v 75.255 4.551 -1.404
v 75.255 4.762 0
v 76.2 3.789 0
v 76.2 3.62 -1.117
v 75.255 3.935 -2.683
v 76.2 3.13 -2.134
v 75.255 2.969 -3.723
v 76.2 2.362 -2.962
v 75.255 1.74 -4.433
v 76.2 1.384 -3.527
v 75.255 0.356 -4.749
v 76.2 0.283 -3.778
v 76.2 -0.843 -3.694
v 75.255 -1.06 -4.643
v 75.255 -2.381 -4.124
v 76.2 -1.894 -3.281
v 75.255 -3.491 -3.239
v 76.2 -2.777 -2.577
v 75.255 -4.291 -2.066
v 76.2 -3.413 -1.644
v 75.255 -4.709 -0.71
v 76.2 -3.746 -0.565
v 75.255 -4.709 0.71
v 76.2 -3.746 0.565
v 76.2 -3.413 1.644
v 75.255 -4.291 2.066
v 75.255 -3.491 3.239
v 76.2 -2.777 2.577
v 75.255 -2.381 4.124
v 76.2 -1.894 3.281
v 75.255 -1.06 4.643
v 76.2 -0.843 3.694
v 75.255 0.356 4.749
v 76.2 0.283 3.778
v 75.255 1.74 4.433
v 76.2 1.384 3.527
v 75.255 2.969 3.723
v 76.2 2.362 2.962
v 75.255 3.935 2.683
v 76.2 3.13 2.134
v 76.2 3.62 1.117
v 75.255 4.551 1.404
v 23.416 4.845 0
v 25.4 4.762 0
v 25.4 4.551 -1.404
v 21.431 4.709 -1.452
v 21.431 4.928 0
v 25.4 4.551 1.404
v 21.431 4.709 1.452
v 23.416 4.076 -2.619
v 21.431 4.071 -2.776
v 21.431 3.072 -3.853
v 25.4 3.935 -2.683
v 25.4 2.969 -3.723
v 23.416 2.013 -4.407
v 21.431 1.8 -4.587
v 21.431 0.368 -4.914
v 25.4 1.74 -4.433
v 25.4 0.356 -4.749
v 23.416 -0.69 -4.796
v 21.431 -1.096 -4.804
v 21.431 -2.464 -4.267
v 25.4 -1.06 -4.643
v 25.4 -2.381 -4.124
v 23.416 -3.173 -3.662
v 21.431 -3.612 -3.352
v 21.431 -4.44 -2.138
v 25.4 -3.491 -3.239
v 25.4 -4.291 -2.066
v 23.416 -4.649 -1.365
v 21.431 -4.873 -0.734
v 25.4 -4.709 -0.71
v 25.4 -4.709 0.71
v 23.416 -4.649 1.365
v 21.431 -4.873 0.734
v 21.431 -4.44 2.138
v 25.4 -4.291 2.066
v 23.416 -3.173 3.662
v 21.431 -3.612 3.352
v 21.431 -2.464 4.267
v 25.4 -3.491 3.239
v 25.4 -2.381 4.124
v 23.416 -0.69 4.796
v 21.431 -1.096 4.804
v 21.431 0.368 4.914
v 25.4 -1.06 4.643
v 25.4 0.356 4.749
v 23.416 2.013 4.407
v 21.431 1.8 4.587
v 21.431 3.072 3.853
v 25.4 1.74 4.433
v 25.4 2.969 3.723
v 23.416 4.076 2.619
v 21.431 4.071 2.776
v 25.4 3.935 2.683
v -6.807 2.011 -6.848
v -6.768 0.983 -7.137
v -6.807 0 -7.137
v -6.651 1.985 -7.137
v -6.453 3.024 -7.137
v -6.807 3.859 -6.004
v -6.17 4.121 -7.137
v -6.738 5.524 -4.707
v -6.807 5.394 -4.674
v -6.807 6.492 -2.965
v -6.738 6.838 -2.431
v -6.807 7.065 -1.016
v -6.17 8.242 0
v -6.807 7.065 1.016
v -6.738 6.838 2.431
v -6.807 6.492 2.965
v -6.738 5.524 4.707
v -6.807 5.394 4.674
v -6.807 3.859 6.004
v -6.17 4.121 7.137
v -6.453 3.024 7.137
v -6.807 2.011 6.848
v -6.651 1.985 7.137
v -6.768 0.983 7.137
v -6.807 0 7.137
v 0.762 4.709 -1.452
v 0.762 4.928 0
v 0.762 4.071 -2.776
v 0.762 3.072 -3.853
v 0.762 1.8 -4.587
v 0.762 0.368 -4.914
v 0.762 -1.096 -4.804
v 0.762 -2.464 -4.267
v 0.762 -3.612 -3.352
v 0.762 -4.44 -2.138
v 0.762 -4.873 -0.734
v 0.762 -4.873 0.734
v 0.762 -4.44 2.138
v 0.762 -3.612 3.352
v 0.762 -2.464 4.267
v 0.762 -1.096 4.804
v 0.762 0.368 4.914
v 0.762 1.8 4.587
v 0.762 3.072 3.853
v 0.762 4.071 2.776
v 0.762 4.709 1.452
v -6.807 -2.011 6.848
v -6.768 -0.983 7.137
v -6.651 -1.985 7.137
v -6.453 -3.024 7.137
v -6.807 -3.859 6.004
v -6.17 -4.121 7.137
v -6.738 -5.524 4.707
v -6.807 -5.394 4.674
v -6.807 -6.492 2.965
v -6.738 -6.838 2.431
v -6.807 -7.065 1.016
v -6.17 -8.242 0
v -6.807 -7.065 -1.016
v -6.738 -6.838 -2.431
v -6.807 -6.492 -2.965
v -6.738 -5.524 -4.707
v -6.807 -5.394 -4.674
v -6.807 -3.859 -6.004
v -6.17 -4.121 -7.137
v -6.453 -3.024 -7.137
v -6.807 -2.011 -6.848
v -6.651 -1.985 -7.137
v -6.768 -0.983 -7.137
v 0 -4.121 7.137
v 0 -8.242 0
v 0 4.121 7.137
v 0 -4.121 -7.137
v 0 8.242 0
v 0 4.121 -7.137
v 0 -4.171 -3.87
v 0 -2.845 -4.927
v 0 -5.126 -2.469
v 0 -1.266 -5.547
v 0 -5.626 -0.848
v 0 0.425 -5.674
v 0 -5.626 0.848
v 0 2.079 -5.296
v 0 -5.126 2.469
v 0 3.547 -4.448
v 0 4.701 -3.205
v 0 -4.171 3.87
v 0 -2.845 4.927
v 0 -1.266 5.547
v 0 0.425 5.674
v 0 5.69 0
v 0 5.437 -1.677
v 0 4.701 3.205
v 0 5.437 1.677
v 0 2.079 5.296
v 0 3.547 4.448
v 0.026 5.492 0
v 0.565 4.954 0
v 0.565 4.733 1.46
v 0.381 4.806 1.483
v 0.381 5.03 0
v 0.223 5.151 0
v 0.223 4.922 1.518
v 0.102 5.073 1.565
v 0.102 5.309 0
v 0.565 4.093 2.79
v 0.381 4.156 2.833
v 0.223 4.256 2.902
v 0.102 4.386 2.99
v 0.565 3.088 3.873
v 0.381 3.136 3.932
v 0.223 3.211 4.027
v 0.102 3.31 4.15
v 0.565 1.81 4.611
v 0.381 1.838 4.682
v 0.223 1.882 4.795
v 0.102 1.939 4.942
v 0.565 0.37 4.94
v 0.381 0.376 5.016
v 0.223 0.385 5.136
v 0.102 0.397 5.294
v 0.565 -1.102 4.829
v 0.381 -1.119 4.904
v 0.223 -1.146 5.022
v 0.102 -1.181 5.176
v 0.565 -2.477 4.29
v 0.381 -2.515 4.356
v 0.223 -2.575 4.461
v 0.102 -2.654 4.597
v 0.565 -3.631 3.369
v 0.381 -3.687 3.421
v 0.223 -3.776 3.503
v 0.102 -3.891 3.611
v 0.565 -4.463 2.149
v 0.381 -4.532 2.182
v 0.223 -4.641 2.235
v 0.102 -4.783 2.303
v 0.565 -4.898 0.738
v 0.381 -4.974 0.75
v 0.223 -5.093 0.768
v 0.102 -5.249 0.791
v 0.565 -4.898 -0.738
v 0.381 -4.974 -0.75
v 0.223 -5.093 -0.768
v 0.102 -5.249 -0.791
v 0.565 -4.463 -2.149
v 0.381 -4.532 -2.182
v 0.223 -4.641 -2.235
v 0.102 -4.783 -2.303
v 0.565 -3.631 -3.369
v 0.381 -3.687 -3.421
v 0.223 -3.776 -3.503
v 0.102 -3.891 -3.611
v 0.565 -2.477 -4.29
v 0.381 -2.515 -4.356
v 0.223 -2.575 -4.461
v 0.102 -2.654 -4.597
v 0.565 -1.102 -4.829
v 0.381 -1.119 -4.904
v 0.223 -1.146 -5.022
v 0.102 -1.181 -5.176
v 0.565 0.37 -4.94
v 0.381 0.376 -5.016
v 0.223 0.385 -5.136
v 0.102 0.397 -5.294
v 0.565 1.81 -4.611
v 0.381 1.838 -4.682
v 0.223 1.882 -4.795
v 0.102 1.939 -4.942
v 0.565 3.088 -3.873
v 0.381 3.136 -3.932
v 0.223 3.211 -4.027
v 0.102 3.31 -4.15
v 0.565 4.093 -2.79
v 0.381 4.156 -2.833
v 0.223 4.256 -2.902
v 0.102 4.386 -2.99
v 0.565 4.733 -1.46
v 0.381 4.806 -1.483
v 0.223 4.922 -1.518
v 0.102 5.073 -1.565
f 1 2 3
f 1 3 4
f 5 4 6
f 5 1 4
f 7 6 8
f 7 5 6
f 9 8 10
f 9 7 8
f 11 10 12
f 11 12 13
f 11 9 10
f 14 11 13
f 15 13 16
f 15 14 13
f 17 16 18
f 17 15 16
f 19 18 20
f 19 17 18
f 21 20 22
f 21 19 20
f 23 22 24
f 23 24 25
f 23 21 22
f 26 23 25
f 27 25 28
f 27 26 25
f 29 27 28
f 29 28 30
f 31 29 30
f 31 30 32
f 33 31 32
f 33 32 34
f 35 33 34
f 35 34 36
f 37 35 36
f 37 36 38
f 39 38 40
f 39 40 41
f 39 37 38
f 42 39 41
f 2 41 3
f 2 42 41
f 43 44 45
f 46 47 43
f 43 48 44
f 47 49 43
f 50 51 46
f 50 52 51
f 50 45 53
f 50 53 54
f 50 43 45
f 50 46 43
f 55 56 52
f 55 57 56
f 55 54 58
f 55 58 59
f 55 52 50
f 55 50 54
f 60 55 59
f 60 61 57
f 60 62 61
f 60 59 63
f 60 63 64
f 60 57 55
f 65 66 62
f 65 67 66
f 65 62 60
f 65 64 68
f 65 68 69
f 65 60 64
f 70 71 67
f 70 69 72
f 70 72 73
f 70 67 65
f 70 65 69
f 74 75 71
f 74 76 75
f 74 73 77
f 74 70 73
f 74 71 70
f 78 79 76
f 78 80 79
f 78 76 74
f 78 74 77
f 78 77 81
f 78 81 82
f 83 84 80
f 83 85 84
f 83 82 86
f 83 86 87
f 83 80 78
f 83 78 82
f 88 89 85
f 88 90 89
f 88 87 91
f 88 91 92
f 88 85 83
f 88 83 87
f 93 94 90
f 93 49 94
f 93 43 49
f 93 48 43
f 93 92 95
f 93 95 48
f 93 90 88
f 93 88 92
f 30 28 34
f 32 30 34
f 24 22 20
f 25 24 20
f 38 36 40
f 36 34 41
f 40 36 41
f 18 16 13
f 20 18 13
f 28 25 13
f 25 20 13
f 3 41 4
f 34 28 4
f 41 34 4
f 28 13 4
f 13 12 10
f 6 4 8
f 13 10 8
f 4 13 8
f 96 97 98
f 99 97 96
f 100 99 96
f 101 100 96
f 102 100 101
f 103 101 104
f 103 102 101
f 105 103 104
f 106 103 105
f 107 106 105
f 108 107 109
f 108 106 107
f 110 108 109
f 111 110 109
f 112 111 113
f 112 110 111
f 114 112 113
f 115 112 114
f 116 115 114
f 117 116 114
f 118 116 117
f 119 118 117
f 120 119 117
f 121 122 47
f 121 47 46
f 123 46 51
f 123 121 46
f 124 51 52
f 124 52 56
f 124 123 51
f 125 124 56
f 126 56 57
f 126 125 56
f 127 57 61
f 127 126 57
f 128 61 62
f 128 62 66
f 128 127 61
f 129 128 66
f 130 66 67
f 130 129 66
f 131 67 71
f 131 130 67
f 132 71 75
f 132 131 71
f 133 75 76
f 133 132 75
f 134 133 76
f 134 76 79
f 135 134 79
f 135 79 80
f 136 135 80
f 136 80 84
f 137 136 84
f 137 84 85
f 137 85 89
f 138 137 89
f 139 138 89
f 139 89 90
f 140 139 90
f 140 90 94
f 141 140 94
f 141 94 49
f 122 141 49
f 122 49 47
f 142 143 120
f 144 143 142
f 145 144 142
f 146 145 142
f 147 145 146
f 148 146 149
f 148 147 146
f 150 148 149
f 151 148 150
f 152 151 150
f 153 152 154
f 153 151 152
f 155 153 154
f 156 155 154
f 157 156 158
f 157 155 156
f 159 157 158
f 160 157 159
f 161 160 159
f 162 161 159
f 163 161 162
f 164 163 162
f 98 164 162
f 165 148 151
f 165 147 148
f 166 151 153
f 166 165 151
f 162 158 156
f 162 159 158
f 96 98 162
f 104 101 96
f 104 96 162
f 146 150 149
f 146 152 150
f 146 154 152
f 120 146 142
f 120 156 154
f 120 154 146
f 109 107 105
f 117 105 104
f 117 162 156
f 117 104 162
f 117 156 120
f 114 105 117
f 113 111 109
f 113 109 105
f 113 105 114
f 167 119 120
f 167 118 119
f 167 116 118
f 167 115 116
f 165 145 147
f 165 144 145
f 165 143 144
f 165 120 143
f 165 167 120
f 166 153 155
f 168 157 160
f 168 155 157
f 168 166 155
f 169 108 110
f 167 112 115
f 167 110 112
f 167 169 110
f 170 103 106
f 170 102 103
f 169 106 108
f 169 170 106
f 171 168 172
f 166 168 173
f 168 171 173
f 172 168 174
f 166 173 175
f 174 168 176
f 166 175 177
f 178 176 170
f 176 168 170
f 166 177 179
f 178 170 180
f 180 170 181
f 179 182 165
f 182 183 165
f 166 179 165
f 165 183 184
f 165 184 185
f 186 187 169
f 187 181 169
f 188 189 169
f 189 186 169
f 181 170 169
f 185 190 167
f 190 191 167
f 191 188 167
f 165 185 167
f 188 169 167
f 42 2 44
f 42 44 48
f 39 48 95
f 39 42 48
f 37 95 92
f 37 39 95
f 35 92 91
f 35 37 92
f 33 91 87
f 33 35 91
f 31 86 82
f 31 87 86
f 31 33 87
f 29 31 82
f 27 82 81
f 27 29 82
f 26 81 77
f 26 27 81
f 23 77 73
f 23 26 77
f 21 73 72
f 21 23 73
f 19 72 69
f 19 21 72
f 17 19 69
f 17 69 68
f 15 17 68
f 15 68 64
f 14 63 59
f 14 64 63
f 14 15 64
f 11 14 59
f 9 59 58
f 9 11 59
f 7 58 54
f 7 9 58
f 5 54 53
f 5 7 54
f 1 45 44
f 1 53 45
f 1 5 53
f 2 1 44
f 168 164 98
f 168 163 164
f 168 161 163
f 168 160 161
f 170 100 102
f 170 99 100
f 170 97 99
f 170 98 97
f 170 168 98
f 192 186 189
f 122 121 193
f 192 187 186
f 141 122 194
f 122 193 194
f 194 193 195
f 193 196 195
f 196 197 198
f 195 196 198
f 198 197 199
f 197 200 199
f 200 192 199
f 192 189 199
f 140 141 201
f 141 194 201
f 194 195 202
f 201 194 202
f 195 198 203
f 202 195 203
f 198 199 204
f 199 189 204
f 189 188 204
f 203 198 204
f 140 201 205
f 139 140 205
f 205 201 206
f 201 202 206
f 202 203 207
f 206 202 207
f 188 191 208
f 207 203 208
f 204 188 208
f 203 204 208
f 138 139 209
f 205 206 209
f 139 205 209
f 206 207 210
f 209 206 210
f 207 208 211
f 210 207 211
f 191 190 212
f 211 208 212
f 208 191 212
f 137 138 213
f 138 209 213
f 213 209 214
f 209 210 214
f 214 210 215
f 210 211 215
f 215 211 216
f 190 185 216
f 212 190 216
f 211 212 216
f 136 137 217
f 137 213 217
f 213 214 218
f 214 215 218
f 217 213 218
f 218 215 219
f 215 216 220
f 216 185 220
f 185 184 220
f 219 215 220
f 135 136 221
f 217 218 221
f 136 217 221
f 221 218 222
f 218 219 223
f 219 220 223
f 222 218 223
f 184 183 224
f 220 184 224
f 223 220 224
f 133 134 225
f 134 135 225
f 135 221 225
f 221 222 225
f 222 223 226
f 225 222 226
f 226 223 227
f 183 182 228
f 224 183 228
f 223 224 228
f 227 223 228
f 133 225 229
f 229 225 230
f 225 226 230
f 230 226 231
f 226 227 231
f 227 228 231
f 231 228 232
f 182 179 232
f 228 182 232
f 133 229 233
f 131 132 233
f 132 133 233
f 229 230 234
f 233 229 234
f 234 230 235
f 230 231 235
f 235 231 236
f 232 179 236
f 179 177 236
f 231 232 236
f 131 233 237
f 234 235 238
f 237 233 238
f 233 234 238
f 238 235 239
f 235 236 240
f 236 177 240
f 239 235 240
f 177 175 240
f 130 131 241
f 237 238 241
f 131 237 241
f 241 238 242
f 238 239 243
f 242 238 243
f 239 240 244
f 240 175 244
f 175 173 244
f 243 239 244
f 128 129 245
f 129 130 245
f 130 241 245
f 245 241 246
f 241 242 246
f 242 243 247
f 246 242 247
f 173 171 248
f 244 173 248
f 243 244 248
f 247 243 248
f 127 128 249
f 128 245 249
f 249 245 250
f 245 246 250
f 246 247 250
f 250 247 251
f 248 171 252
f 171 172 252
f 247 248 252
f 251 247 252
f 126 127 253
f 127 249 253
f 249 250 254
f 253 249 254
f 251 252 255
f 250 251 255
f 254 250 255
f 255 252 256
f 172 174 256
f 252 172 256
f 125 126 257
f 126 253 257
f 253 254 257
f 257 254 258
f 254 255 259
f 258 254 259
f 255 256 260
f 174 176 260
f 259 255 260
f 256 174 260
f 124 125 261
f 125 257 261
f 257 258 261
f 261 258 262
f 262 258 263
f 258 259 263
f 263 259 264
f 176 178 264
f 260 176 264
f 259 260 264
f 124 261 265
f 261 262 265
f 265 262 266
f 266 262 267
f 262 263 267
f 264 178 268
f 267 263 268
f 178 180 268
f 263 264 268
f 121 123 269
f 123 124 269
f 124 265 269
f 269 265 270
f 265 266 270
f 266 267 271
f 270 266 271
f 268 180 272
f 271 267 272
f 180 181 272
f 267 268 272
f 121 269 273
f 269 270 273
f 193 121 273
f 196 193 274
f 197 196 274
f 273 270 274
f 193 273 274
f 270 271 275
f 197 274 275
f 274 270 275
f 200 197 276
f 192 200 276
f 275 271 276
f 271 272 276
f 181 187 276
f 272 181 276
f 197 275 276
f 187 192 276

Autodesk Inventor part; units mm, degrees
ref_plane "YZ Plane" through (0, 0, 0) normal (1, 0, 0) x (0, 1, 0)
ref_plane "XZ Plane" through (0, 0, 0) normal (0, 1, 0) x (-1, 0, 0)
sketch "Sketch1" plane through (0, 0, 0) normal (0, 0, 1) x (1, 0, 0)
  line L0 (0, 7.1374) -> (0, 4.9276)
  line L1 (25.4, 4.7625) -> (76.2, 4.7625)
  line L2 (76.2, 4.7625) -> (76.2, 0)
  line L3 (76.2, 0) -> (-0.0001, 0)
  line L4 (-15.2401, 0) -> (91.44, 0) projected
  line L5 (-0.0001, 0) -> (-0.0001, 7.1374)
  line L6 (-0.0001, 7.1374) -> (0, 7.1374)
  line L7 (25.4, 4.7625) -> (21.4311, 4.9276)
  line L8 (21.4311, 4.9276) -> (0, 4.9276)
  line L9 (0, -1.4275) -> (0, 8.5649) projected
  dimension "d0" = 76.2
  dimension "d1" = 50.8
revolve "Body" add sketch "Sketch1" angle 360 about axis through (76.2, 0, 0) along (-1, 0, 0)
sketch "Sketch2" plane through (-0.0001, 0, 0) normal (-1, 0, 0) x (0, 0, 1)
  line L0 (0, 8.2416) -> (7.1374, 4.1208)
  line L1 (7.1374, 4.1208) -> (7.1374, -4.1208)
  line L2 (7.1374, -4.1208) -> (0, -8.2416)
  line L3 (0, -8.2416) -> (-7.1374, -4.1208)
  line L4 (-7.1374, -4.1208) -> (-7.1374, 4.1208)
  line L5 (-7.1374, 4.1208) -> (0, 8.2416)
  point P0 (0, 0)
  point P1 (0, 0)
  dimension "d11" = 14.2748
extrude "Head" add sketch "Sketch2" along normal blind 6.8072
sketch "Sketch4" plane through (0, 0, 0) normal (0, 0, 1) x (1, 0, 0)
  line L0 (-6.8073, 7.1374) -> (-6.8073, 8.2416)
  line L1 (-6.8073, 8.2416) -> (-6.1698, 8.2416)
  line L2 (-6.1698, 8.2416) -> (-6.8073, 7.1374)
  line L3 (-8.1687, 0) -> (1.3613, 0) projected
  line L4 (-0.0001, 8.2416) -> (-6.8073, 8.2416) projected
  line L5 (-6.8073, 4.1208) -> (-6.8073, 8.2416) projected
  dimension "d5" = 30
  dimension "d19" = 14.2748
revolve "Chamfer1" cut sketch "Sketch4" angle 360 about axis through (-10, 0, 0) along (1, 0, 0)
thread "Thread" size "3/8-16 UNC" class "2A" standard "ANSI Unified Screw Threads" full length
chamfer "Chamfer2" distance 0.9739 distance2 0.9447 1 edges at (76.2, -4.7625, 0) measured on face at (76.2, 1.5414, -0.3799)
ref_plane "Work Plane1" through (1.525, 0, 0) normal (0, 0, 1) x (1, 0, 0)
fillet "Fillet2" radius 0.762 1 edges at (0, -4.9276, 0)
equation "\"d63\" = R"
equation "\"d11\" = SW"
equation "\"d3\" = KOH - SD"
equation "\"d15\" = GEL"
equation "\"d6\" = -0.5 * SPD + 0.5 * GD"
equation "\"d5\" = ANG1"
equation "\"d19\" = SW0"
equation "\"NLG\" = 190.5"
equation "\"GD\" = NND"
equation "\"BDM\" = 9.8552"
equation "\"KOH\" = 6.8072"
equation "\"GEL\" = 31.75"
equation "\"SW\" = 14.2748"
equation "\"SW0\" = SW"
equation "\"SPD\" = GD1"
equation "\"SD2\" = SW"
equation "\"SD\" = 0"
equation "\"ANG1\" = 30deg"
equation "\"GAL\" = 3.96875"
equation "\"GUL\" = 0.238 * GAL"
equation "\"R\" = 0.762"
equation "\"d62\" = -NLG - SD + GUL"
equation "\"GD1\" = 7.5773"
equation "\"THREADDIA\" = 9.525"
equation "\"TOA\" = 30deg"
equation "\"NND\" = 9.525"
equation "\"E0\" = 1.155 * SW"
properties part number "am-1055" material "Steel, Mild"
